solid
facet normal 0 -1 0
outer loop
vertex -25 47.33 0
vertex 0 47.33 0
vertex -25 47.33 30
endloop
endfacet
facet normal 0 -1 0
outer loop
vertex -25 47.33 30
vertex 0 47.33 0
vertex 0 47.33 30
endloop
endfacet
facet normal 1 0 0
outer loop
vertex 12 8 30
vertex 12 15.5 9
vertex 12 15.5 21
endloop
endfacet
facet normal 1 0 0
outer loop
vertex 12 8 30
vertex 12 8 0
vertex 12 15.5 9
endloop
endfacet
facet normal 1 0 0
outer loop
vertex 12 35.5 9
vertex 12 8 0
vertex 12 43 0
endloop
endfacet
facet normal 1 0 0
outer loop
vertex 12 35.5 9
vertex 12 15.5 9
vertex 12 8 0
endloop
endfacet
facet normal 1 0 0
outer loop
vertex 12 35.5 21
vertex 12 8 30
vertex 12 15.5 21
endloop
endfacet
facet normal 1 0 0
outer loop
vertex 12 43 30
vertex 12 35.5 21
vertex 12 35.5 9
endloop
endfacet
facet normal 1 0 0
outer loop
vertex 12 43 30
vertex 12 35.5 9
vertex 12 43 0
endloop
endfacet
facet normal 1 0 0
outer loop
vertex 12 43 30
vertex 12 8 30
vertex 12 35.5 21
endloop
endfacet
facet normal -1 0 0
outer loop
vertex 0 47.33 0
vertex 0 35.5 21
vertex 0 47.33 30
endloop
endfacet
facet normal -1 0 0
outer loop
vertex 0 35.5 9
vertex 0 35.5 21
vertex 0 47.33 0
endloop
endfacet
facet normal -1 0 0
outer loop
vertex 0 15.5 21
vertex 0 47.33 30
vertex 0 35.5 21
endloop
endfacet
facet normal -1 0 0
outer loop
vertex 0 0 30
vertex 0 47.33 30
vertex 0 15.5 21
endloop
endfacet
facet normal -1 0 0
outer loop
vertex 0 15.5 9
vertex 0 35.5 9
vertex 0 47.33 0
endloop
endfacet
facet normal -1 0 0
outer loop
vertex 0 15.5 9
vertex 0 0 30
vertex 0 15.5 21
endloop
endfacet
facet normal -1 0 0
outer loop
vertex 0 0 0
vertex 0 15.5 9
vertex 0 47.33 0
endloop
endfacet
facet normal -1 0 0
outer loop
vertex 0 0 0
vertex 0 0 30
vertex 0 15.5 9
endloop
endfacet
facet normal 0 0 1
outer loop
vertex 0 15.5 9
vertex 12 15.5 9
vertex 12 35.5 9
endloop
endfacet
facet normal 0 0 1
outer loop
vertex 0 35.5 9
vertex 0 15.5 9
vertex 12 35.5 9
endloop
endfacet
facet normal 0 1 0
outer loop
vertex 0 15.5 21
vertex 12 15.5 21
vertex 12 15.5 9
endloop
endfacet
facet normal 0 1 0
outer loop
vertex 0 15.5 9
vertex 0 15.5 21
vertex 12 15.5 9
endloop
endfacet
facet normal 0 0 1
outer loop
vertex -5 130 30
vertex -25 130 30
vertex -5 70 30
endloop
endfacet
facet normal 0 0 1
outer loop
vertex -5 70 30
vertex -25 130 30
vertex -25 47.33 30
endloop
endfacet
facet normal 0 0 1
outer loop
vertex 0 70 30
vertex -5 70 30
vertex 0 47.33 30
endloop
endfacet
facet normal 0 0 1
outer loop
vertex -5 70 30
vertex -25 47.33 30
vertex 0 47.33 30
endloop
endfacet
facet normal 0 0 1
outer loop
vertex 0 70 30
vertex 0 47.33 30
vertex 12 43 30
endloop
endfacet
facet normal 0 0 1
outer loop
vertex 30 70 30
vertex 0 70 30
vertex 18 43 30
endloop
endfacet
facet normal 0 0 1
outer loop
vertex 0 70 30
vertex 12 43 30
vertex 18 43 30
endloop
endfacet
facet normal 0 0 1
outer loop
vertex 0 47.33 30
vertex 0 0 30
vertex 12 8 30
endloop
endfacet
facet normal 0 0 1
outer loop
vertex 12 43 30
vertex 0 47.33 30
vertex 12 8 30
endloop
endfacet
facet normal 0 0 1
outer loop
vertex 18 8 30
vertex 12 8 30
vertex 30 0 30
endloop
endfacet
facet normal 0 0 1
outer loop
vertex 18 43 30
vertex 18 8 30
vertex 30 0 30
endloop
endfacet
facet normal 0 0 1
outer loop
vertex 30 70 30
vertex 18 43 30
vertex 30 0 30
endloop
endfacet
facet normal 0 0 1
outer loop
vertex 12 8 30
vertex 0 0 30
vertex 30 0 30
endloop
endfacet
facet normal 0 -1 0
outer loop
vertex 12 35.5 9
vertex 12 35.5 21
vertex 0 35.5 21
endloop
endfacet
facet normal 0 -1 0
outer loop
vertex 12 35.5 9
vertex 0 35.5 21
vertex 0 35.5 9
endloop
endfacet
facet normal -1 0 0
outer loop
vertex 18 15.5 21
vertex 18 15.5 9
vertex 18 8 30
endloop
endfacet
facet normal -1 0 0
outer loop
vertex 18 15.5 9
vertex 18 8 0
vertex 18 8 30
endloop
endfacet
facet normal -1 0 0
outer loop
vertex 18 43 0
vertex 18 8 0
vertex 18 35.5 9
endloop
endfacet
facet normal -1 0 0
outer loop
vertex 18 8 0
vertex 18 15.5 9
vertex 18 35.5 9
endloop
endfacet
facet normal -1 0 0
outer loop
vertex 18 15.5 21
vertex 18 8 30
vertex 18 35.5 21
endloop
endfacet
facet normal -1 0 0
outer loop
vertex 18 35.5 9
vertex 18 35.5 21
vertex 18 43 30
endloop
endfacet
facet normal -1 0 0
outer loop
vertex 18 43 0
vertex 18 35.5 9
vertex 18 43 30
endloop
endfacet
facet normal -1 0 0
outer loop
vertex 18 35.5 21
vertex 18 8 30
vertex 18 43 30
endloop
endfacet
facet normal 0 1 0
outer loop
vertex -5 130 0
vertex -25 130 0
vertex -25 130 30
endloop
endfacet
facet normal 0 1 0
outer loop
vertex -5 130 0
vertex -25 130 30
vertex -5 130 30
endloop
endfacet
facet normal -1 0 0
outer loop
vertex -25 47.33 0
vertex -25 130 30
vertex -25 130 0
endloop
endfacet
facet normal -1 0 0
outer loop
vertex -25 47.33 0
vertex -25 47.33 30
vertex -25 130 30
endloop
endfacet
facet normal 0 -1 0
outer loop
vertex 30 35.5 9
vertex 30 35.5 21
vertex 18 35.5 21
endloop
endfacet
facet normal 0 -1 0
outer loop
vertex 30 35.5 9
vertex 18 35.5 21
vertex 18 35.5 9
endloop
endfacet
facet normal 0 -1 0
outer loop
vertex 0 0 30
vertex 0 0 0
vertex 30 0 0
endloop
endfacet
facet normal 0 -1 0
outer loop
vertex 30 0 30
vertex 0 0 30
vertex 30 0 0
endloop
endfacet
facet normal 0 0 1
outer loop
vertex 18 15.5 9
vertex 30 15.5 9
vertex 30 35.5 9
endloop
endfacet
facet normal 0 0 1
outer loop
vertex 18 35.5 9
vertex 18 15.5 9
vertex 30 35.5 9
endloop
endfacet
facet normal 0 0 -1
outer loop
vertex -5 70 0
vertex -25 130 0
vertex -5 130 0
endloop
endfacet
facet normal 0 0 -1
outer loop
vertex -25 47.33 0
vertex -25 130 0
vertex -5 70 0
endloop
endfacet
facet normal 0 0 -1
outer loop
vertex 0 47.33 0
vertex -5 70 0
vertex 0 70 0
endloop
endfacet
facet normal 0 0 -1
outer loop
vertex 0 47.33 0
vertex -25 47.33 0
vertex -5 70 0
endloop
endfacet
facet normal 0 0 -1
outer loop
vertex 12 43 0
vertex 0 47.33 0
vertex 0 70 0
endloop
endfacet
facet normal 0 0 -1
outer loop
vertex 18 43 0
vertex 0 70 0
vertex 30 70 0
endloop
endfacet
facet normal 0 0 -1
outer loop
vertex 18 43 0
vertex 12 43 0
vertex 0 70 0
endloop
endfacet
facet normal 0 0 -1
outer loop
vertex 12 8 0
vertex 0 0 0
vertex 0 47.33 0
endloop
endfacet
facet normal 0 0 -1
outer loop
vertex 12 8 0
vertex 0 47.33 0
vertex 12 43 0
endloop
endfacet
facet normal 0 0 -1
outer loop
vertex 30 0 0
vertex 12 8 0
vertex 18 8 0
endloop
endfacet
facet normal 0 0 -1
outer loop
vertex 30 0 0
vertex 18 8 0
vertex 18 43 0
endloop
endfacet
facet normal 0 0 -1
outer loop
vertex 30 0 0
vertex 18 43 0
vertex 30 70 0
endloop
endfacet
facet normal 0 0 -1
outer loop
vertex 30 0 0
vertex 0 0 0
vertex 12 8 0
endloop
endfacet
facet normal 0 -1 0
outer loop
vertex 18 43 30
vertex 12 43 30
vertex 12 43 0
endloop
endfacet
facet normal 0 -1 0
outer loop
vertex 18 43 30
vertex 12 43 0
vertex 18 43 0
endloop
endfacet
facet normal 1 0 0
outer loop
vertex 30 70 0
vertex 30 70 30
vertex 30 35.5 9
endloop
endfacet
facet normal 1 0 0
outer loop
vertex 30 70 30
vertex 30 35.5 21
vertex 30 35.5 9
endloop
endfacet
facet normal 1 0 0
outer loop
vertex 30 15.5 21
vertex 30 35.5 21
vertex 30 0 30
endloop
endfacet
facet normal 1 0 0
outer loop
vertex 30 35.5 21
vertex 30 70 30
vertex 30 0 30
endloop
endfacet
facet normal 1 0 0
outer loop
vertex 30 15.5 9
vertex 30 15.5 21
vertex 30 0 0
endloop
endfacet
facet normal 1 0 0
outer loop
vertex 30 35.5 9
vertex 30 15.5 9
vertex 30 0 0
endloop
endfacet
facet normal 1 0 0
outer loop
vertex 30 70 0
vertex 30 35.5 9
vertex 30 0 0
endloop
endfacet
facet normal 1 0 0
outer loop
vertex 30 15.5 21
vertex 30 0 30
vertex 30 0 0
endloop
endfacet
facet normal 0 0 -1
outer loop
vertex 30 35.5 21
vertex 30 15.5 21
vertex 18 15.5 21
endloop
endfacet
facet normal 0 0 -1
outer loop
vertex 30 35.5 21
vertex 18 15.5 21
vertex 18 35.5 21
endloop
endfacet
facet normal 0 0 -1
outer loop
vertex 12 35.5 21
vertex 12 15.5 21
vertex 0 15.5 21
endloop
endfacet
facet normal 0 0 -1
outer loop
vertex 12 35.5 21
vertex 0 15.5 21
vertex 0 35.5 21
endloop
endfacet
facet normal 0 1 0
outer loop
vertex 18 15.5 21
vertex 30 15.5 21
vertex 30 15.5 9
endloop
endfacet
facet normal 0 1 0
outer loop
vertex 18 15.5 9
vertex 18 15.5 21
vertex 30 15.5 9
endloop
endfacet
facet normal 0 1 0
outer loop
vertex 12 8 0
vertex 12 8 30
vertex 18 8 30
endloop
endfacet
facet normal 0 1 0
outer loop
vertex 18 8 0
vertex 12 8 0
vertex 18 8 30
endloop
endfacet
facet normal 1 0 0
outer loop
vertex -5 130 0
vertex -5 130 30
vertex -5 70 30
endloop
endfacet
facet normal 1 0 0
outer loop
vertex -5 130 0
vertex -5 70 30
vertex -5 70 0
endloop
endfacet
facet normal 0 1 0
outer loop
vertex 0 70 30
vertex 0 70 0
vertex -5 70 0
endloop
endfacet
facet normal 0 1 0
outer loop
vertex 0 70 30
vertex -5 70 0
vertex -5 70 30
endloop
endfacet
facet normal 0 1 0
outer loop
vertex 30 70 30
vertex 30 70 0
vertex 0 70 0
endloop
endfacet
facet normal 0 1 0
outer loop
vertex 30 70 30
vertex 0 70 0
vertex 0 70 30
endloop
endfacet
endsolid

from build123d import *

# Parameters (mm, degrees)
SKETCH1_W           = 30
SKETCH1_H           = 30
BOSS_EXTRUDE1_DEPTH = 70
SKETCH2_W           = 6
SKETCH2_H           = 35
CUT_EXTRUDE1_DEPTH  = 82.853527719
SKETCH3_W           = 12
SKETCH3_H           = 20
CUT_EXTRUDE2_DEPTH  = 82.853527719
SKETCH4_W           = 30
SKETCH4_H           = 22.669600449
BOSS_EXTRUDE2_DEPTH = 25
SKETCH5_W           = 20
SKETCH5_H           = 30
BOSS_EXTRUDE3_DEPTH = 60


with BuildPart() as part:
    # Sketch1 → Boss-Extrude1 (new body)
    with BuildSketch(Plane(origin=(0, 0, 0), x_dir=(1, 0, 0), z_dir=(0, 1, 0))):
        with Locations((15, -15)):
            Rectangle(SKETCH1_W, SKETCH1_H)
    extrude(amount=BOSS_EXTRUDE1_DEPTH)

    # Sketch2 → Cut-Extrude1 (cut, through all)
    with BuildSketch(Plane.XY.offset(30)):
        with Locations((15, 25.5)):
            Rectangle(SKETCH2_W, SKETCH2_H)
    extrude(amount=-CUT_EXTRUDE1_DEPTH, mode=Mode.SUBTRACT)

    # Sketch3 → Cut-Extrude2 (cut, through all)
    with BuildSketch(Plane(origin=(30, 0, 0), x_dir=(0, 0, -1), z_dir=(1, 0, 0))):
        with Locations((-15, 25.5)):
            Rectangle(SKETCH3_W, SKETCH3_H)
    extrude(amount=-CUT_EXTRUDE2_DEPTH, mode=Mode.SUBTRACT)

    # Sketch4 → Boss-Extrude2 (add)
    with BuildSketch(Plane.ZY):
        with Locations((15, 58.665199775)):
            Rectangle(SKETCH4_W, SKETCH4_H)
    extrude(amount=BOSS_EXTRUDE2_DEPTH)

    # Sketch5 → Boss-Extrude3 (add)
    with BuildSketch(Plane(origin=(0, 70, 0), x_dir=(1, 0, 0), z_dir=(0, 1, 0))):
        with Locations((-15, -15)):
            Rectangle(SKETCH5_W, SKETCH5_H)
    extrude(amount=BOSS_EXTRUDE3_DEPTH)


solid = part.part
